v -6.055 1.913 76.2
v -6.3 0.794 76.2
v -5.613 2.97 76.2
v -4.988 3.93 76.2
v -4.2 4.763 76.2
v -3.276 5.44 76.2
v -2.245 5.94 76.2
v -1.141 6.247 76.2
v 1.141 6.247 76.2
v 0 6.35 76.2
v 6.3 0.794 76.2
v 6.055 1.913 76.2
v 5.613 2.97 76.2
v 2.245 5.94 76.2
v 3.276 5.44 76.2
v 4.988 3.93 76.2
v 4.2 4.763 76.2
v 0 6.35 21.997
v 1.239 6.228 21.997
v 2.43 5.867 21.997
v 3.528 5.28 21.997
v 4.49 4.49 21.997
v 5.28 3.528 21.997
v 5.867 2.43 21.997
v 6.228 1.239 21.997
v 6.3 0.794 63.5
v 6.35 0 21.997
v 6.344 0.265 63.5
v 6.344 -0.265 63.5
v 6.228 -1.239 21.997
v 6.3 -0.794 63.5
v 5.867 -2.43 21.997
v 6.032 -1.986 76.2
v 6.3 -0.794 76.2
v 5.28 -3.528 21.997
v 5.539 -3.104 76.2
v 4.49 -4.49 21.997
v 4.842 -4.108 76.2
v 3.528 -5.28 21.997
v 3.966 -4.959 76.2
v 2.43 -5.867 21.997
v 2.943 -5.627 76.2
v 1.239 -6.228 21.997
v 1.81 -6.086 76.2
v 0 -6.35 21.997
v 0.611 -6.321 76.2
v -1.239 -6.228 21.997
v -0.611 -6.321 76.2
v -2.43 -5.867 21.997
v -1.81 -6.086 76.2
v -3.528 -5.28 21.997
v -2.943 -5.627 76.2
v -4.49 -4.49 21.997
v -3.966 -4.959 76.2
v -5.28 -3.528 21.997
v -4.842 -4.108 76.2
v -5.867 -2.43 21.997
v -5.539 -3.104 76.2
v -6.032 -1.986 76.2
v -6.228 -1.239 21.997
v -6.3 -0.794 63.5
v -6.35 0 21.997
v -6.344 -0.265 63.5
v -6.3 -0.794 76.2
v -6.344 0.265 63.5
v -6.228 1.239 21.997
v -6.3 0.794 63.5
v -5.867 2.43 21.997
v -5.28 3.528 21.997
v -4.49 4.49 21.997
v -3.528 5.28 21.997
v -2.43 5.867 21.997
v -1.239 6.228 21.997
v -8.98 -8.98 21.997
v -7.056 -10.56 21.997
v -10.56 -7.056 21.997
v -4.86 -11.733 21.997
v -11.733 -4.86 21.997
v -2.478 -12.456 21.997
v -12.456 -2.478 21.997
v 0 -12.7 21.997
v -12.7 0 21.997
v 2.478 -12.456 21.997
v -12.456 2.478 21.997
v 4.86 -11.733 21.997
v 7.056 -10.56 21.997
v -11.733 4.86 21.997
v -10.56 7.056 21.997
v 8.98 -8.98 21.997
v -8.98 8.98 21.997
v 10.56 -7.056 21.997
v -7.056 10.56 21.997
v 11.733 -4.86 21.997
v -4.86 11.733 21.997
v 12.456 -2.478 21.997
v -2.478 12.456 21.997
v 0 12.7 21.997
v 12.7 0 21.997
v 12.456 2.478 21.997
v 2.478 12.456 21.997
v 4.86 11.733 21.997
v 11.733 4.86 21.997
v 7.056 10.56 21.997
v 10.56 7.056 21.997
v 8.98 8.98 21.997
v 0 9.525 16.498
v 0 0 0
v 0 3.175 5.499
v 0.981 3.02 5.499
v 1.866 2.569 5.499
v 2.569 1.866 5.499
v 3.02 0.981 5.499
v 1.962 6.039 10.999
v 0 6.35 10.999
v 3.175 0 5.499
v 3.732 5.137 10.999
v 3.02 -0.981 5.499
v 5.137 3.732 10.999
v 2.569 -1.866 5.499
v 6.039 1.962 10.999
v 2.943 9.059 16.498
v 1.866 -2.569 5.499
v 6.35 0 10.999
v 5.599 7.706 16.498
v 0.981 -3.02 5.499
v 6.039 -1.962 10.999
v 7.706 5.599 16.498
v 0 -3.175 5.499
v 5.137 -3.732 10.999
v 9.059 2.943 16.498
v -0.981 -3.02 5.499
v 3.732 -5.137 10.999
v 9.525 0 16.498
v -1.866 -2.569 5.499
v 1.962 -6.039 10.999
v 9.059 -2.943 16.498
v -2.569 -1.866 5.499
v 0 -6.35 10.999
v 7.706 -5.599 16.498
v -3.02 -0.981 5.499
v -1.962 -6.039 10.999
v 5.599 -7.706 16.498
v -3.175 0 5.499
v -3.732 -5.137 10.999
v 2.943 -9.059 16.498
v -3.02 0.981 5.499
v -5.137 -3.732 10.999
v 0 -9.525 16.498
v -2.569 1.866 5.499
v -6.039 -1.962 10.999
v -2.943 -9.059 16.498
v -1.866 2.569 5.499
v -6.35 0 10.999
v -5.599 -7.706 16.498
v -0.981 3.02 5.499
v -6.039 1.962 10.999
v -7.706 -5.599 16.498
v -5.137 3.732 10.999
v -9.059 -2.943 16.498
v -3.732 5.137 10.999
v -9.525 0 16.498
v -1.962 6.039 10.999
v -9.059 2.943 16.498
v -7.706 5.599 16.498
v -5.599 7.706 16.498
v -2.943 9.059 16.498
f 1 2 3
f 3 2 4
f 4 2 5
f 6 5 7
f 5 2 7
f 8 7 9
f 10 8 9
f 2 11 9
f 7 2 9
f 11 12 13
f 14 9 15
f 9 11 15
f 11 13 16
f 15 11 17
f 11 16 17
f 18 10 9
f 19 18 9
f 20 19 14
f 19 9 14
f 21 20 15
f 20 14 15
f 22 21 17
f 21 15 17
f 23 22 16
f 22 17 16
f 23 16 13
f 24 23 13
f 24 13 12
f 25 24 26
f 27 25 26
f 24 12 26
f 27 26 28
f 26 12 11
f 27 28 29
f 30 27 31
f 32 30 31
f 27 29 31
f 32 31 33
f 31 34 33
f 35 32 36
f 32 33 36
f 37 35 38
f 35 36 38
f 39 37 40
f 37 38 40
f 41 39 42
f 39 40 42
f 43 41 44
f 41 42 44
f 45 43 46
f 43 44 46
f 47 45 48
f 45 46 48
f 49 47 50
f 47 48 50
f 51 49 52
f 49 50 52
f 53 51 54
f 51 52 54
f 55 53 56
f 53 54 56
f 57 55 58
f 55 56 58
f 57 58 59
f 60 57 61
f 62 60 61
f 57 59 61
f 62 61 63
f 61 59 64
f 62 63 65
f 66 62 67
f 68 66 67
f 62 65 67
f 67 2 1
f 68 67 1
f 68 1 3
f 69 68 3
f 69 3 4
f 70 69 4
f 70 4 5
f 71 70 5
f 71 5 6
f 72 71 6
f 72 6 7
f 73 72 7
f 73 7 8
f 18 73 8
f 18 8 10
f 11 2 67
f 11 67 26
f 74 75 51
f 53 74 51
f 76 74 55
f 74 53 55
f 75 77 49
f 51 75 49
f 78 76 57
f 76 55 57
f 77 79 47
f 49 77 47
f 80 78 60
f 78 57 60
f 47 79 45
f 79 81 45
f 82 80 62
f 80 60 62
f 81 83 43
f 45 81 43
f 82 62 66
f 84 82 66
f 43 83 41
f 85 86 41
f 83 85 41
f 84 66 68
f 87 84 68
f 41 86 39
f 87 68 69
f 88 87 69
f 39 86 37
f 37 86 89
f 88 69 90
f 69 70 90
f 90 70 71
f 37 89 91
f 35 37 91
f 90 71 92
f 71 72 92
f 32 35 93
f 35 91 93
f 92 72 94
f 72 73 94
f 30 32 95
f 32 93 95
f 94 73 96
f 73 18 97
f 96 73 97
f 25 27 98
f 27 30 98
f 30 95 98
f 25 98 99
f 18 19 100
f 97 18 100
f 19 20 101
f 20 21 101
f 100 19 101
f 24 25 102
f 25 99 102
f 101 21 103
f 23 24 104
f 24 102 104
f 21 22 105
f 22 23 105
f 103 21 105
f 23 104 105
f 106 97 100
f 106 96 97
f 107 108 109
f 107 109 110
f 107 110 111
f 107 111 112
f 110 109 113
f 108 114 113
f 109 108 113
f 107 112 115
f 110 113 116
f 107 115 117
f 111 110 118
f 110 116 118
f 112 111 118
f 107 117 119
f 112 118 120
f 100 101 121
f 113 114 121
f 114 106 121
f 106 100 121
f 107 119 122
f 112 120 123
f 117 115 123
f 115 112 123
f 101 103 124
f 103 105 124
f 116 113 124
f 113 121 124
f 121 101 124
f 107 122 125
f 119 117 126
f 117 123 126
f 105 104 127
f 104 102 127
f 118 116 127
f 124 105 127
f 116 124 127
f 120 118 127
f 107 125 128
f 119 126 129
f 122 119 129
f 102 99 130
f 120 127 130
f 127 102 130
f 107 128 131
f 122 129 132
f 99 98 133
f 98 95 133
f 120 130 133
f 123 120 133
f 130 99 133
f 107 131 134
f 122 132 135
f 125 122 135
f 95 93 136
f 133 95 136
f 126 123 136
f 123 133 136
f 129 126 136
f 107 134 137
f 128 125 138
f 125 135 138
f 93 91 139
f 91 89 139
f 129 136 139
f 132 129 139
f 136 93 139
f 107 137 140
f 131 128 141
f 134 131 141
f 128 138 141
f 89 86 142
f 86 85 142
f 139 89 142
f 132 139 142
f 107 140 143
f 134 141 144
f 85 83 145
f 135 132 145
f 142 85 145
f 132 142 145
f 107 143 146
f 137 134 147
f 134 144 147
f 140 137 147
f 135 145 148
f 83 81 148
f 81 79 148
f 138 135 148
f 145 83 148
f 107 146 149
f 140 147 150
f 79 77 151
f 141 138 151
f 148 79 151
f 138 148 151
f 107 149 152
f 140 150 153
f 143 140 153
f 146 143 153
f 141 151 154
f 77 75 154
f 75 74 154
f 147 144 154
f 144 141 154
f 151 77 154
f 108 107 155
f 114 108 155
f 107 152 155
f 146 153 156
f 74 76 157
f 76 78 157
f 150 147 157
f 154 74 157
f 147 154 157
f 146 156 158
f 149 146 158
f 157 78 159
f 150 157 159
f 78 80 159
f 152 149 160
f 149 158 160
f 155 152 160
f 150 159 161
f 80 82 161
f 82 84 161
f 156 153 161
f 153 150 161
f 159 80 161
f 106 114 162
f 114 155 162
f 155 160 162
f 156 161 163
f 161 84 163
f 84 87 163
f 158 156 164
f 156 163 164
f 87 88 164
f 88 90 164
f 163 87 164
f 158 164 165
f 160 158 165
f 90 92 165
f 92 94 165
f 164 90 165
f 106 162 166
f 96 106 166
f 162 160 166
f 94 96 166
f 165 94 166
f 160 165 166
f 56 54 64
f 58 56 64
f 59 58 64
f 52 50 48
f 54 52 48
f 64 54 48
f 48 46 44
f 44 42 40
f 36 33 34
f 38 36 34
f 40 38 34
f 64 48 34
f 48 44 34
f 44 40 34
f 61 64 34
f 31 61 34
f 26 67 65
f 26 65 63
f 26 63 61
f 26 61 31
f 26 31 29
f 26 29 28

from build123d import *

# Parameters (mm, degrees)
F2_W     = 25.4
F2_H     = 1.5875
F3_DEPTH = 12.7


with BuildPart() as f1:
    # F0 (on Right) → F1 (revolve)
    with BuildSketch(Plane.YZ):
        Polygon((6.35, 76.2), (0, 76.2), (0, 0), (12.7, 21.997045), (6.35, 21.997045), align=None)
    revolve(axis=Axis((0, 0, 38.1), (0, 0, -1)))

    # F2 (on face) → F3 (cut)
    with BuildSketch(Plane.XY.offset(76.2)):
        Rectangle(F2_W, F2_H)
    extrude(amount=-F3_DEPTH, mode=Mode.SUBTRACT)


solid = f1.part
